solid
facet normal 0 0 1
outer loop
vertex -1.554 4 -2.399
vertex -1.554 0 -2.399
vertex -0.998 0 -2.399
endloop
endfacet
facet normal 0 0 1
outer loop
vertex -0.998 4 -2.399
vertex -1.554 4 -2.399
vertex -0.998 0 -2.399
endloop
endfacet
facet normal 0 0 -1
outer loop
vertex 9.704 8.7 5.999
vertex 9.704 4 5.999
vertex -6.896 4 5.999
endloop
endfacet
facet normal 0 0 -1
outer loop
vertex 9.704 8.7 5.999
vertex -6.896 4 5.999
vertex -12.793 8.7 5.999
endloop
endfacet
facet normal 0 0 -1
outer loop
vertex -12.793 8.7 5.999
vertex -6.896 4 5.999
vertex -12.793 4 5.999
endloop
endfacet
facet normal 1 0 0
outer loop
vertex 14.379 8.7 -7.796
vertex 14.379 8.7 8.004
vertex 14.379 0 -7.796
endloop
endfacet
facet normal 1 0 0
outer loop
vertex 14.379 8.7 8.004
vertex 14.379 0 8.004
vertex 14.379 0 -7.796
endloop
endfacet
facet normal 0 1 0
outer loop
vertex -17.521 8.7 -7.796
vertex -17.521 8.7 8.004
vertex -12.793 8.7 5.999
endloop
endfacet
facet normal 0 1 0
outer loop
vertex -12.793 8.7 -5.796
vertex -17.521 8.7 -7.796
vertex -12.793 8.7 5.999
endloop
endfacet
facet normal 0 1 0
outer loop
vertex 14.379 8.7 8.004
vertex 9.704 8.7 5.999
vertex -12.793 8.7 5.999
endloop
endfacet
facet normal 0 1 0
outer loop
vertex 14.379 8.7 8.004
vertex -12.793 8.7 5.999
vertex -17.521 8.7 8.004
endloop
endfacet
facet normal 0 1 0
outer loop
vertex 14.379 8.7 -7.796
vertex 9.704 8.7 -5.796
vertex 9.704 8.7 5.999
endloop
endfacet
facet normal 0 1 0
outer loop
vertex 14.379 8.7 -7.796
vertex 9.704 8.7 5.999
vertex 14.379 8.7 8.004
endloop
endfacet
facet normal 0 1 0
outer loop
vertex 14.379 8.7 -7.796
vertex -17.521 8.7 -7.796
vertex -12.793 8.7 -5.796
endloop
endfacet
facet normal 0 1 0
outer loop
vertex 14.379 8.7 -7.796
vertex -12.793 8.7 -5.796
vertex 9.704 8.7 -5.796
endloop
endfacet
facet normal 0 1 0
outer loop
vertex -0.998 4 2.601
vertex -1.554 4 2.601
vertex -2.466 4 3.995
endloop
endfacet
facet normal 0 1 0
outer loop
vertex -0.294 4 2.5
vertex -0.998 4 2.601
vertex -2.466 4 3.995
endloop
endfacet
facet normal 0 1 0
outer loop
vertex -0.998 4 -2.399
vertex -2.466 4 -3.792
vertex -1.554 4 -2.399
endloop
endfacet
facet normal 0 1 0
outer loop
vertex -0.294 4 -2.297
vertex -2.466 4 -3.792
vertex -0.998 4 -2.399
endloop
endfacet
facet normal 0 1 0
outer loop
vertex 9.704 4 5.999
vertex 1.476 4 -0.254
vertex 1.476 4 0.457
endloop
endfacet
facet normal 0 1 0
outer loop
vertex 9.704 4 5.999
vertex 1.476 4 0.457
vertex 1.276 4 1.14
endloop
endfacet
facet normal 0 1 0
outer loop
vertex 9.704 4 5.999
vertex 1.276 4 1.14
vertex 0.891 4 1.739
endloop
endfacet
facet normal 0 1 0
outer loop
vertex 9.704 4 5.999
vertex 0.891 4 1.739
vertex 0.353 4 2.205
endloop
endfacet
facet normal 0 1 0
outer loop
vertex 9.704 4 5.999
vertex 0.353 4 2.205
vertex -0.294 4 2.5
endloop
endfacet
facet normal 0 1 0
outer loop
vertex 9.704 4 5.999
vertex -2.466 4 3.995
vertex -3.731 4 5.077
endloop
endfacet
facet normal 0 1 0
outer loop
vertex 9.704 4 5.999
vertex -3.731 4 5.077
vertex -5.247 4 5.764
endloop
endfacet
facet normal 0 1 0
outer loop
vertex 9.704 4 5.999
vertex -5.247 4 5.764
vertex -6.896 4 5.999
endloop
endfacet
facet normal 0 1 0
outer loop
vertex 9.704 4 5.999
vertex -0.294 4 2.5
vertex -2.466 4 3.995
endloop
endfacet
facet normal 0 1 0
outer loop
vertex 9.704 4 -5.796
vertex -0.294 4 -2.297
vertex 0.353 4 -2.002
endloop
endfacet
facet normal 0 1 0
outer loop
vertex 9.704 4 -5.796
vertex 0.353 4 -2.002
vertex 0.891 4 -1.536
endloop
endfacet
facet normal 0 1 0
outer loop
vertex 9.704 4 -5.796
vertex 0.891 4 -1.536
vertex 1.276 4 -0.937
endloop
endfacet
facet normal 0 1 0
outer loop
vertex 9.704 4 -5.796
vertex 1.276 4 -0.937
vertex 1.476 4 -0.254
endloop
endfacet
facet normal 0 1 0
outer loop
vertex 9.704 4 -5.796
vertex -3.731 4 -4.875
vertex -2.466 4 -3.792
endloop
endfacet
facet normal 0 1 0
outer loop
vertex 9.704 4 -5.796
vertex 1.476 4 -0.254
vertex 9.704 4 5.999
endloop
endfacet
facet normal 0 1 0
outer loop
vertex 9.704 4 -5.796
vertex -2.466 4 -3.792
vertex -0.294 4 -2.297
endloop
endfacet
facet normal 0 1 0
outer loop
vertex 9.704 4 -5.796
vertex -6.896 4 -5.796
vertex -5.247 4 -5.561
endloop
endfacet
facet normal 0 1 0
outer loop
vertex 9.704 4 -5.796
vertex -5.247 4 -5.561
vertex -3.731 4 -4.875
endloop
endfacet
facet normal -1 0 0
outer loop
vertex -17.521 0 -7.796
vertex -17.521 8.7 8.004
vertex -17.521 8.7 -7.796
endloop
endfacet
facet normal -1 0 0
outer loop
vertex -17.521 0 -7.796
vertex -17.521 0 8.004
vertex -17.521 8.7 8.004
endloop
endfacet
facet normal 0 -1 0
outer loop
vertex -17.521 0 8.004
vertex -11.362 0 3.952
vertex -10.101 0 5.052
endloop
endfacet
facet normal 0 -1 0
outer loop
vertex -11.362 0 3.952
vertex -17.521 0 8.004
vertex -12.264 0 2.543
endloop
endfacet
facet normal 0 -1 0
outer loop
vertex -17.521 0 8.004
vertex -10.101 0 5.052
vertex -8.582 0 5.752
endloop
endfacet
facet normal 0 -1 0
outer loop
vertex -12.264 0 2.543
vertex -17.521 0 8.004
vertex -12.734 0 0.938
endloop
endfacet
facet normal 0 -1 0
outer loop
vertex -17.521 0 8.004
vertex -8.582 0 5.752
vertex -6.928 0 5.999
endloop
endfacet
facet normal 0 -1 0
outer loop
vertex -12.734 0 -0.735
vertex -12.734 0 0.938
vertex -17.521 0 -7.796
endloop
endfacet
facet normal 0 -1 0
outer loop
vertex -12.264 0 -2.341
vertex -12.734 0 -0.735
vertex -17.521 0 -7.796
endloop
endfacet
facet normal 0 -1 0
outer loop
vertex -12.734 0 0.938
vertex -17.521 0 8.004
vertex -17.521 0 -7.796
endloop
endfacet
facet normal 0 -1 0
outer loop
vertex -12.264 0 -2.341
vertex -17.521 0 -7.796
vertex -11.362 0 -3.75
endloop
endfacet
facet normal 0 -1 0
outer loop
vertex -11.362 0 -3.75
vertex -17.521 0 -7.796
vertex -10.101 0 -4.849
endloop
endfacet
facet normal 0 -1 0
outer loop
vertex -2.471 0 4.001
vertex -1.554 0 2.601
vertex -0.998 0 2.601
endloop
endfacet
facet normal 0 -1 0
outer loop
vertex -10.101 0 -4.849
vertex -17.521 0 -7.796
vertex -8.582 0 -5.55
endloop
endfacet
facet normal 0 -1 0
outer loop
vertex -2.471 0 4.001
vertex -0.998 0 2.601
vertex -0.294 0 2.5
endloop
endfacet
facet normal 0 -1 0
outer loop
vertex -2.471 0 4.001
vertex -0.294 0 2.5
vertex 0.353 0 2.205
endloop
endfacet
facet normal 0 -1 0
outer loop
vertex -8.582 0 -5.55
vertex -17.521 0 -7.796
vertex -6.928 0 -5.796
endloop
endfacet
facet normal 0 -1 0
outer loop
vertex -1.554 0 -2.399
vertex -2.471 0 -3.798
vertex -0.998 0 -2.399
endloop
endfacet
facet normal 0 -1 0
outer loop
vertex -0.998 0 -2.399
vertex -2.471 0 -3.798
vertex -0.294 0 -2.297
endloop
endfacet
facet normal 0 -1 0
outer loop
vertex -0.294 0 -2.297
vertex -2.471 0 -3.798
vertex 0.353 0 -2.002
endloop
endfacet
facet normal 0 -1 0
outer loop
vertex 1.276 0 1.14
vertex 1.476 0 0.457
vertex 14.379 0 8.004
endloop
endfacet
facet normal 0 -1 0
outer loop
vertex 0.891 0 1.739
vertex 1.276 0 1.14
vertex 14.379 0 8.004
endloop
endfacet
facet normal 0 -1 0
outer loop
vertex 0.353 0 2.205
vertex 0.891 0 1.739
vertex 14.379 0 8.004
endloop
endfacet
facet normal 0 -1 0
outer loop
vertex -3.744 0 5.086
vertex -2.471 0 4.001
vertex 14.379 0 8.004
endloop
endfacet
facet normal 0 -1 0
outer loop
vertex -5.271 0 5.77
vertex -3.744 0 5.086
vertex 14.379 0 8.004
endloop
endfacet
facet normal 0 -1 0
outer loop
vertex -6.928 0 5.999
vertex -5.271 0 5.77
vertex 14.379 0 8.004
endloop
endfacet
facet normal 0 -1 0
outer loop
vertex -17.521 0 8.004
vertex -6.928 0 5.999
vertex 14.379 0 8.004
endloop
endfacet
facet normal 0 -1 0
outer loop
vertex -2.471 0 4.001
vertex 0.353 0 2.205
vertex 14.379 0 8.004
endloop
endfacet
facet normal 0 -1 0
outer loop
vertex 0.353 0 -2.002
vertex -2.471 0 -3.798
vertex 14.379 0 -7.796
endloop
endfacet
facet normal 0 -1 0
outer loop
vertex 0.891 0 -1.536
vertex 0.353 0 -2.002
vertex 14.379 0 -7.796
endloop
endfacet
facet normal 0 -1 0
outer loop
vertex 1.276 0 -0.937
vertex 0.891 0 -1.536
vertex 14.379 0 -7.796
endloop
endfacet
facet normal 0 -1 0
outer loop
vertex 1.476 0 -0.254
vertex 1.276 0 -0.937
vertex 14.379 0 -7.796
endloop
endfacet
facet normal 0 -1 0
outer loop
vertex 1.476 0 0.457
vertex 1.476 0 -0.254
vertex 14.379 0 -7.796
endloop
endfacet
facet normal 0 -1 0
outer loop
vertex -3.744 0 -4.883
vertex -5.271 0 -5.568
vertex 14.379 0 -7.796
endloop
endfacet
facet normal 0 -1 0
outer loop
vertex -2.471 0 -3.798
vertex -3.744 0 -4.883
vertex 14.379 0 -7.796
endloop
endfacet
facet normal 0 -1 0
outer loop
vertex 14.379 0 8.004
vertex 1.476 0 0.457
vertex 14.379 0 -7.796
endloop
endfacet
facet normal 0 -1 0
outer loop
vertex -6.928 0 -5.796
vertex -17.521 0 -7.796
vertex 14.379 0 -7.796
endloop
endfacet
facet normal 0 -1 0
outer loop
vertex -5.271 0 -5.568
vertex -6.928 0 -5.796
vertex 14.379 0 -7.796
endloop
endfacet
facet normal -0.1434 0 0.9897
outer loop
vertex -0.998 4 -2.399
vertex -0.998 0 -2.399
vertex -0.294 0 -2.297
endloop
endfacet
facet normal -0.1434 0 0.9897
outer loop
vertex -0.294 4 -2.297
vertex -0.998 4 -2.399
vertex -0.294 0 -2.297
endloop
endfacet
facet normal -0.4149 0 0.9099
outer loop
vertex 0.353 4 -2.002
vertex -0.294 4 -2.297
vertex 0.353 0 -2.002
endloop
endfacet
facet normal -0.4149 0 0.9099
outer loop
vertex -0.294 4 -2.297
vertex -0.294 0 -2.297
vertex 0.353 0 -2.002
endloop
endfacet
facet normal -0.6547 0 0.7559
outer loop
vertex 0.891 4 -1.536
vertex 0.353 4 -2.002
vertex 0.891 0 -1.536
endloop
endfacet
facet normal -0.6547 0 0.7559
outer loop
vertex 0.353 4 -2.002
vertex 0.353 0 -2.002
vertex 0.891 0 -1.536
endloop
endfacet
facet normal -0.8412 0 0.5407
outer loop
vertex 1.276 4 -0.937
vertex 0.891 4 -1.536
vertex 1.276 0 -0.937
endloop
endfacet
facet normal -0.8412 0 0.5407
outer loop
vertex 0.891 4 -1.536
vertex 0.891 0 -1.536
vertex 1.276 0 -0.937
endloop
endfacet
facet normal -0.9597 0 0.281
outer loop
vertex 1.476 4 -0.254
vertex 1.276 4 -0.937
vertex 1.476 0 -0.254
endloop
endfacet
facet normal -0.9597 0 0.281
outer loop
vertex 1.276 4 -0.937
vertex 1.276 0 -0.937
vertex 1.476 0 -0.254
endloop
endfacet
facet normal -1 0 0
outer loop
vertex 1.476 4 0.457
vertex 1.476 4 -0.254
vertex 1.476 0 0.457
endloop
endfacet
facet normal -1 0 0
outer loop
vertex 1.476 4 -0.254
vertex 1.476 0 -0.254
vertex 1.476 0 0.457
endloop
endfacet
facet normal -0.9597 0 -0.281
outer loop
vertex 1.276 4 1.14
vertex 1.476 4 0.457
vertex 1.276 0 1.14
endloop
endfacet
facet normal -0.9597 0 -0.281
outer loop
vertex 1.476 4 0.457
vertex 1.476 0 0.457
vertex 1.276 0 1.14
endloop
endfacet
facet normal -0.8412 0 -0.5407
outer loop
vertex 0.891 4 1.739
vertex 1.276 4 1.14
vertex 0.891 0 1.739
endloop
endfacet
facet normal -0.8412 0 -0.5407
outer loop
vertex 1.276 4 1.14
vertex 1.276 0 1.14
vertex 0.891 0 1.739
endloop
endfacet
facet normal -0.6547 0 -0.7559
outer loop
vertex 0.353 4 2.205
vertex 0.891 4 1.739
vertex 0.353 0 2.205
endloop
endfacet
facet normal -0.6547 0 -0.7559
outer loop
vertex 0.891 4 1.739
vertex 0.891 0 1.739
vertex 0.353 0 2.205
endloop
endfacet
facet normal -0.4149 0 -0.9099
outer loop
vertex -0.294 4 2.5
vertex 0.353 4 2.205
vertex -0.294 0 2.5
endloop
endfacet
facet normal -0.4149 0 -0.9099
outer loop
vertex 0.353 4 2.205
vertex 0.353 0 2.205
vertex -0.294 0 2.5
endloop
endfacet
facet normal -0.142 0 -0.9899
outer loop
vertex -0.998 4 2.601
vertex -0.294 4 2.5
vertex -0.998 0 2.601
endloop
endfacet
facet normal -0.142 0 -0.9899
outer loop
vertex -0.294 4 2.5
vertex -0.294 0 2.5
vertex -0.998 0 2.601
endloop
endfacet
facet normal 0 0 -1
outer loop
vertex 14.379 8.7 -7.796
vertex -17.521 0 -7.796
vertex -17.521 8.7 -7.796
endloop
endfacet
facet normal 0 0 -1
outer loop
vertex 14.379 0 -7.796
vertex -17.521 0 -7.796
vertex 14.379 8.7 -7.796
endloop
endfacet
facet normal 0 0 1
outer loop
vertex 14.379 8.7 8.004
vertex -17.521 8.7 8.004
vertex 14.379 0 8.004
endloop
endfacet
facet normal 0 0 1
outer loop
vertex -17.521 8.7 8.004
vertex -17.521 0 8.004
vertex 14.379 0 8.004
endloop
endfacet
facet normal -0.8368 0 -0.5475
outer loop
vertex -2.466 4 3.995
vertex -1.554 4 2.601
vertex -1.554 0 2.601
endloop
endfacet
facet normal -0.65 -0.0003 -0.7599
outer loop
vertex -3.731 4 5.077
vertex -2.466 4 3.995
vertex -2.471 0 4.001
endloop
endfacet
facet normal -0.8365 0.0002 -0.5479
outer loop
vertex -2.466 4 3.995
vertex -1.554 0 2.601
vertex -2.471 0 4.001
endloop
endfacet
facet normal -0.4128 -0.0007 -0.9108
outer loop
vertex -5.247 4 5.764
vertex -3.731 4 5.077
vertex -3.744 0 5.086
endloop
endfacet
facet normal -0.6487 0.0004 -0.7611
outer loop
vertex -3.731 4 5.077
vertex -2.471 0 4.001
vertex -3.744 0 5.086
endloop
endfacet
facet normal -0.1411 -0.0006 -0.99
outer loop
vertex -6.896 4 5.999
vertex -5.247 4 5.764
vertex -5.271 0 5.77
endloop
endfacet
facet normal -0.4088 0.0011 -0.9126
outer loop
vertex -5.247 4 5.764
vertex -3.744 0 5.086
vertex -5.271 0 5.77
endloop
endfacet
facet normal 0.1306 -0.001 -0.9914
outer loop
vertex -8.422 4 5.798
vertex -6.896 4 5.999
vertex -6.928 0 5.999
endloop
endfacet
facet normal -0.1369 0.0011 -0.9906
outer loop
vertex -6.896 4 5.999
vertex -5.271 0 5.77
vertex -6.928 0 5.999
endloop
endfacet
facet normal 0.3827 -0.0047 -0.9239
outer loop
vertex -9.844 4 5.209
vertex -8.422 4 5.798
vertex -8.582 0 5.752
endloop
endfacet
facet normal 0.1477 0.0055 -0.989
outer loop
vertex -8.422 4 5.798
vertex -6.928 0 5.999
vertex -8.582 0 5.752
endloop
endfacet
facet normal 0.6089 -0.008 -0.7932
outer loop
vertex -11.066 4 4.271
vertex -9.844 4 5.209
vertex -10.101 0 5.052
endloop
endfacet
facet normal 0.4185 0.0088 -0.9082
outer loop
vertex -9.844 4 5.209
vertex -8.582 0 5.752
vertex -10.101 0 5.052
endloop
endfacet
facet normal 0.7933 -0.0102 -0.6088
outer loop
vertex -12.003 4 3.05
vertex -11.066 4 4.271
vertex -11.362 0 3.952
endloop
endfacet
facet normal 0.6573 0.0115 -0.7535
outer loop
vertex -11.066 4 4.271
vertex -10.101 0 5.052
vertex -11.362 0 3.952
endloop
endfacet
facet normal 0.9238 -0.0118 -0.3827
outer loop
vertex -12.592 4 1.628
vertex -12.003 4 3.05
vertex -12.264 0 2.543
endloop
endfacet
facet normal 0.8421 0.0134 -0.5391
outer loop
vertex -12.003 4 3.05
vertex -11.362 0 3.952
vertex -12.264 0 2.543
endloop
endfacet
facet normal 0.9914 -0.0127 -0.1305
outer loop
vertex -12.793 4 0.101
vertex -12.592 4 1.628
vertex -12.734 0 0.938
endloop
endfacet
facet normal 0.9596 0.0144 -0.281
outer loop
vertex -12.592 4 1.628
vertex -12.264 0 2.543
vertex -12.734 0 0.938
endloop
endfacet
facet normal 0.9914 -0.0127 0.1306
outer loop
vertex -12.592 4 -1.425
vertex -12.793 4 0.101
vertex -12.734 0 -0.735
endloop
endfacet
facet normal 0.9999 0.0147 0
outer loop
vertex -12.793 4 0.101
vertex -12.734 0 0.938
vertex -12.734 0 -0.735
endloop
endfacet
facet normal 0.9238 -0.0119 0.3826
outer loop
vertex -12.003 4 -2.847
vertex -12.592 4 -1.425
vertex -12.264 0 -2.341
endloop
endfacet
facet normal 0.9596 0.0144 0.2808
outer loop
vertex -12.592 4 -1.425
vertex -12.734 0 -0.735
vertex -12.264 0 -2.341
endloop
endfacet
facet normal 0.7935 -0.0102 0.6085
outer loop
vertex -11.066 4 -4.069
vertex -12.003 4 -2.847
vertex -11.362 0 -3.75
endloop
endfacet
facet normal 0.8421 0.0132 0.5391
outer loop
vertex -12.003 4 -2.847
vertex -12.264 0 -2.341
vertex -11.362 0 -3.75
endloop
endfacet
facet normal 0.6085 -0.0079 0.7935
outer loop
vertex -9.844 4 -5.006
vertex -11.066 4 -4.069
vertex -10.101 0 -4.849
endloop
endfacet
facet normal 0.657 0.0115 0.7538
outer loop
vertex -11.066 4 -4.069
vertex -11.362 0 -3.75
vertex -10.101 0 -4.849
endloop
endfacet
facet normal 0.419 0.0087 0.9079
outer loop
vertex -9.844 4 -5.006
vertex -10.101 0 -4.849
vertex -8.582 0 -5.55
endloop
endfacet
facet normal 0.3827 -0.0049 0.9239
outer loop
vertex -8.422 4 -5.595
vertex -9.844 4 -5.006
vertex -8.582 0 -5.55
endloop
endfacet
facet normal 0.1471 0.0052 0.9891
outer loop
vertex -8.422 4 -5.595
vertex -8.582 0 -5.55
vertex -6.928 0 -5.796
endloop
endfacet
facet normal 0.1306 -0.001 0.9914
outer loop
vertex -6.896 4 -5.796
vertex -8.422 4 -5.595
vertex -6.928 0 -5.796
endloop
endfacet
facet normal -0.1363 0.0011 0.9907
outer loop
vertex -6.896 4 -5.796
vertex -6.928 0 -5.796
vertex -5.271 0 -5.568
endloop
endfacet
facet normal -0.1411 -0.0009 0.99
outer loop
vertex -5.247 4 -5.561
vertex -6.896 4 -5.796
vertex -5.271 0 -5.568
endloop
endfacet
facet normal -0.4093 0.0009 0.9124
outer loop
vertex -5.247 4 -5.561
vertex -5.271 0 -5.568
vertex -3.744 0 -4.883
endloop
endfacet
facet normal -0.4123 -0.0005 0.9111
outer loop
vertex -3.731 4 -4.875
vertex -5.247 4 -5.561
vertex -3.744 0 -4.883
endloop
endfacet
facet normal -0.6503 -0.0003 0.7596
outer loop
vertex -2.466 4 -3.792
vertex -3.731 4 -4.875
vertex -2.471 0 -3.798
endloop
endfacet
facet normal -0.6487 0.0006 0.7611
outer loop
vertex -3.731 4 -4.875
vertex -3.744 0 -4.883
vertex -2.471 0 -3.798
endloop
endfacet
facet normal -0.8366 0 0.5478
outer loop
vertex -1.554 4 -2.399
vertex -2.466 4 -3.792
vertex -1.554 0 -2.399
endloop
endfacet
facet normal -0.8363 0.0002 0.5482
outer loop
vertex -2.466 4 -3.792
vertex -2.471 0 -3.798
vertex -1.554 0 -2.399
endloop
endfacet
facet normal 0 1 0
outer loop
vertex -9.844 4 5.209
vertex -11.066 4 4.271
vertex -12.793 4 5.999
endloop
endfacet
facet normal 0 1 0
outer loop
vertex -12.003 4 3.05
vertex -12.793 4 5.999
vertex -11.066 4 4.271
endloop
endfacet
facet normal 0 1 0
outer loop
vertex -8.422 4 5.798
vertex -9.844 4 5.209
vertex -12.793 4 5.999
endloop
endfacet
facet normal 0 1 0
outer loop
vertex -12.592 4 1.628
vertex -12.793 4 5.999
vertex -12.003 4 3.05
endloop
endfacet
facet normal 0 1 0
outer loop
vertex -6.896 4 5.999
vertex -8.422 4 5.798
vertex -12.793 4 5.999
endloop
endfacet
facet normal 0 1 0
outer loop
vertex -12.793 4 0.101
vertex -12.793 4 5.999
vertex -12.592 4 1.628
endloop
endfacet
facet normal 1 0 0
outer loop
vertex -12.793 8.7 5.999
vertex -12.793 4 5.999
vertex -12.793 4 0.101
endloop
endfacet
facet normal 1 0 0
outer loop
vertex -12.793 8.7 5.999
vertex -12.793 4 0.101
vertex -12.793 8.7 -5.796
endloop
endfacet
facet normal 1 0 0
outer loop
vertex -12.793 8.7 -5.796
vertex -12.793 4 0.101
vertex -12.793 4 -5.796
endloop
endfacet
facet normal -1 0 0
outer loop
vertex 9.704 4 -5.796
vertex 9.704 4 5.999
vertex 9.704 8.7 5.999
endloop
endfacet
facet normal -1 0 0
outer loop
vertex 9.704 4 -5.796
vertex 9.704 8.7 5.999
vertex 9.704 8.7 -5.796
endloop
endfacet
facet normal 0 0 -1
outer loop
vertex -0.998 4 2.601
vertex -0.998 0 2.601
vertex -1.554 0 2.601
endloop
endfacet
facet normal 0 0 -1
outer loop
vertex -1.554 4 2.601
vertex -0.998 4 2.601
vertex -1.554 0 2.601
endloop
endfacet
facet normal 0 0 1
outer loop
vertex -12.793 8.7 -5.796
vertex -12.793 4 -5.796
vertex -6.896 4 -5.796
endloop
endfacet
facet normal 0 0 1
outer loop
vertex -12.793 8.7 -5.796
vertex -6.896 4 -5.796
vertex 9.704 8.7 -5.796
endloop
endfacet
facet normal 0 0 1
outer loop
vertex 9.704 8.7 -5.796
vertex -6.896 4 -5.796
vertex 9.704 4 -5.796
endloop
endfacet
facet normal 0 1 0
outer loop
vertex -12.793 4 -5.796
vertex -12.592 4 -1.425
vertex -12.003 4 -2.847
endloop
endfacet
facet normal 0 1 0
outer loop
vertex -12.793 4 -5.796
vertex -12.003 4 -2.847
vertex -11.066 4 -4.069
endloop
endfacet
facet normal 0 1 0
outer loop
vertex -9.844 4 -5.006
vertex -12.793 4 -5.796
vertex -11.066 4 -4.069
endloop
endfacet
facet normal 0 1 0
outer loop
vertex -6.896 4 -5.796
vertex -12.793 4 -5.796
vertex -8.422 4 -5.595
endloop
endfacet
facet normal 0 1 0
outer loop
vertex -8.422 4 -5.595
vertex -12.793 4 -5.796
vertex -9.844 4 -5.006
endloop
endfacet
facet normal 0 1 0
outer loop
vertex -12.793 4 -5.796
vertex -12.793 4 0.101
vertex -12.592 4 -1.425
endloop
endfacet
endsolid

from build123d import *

# Parameters (mm, degrees)
BOSS_EXTRUDE5_DEPTH = 4
SKETCH8_W           = 31.9
SKETCH8_H           = 15.8
BOSS_EXTRUDE8_DEPTH = 4.7


with BuildPart() as part:
    # Sketch1 → Boss-Extrude5 (new body)
    with BuildSketch(Plane(origin=(0, 0, 0), x_dir=(1, 0, 0), z_dir=(0, 1, 0))):
        Polygon((-17.521212205, 5.796054243), (-17.521212205, -6.003945757), (-17.521212205, -8.003945757), (14.378787795, -8.003945757), (14.378787795, -6.003945757), (14.378787795, 5.796054243), (14.378787795, 7.796054243), (-17.521212205, 7.796054243), align=None)
        with BuildLine():
            Line((-0.998289948, -2.601375998), (-1.554401677, -2.601375998))
            ThreePointArc((-1.554401677, -2.601375998), (-12.793150429, -0.101375998), (-1.554401677, 2.398624002))
            Line((-1.554401677, 2.398624002), (-0.998289948, 2.398624002))
            ThreePointArc((-0.998289948, 2.398624002), (1.501710052, -0.101375998), (-0.998289948, -2.601375998))
        make_face(mode=Mode.SUBTRACT)
    extrude(amount=BOSS_EXTRUDE5_DEPTH)

    # Sketch8 → Boss-Extrude8 (add)
    with BuildSketch(Plane(origin=(0, 4, 0), x_dir=(1, 0, 0), z_dir=(0, 1, 0))):
        with Locations((-1.571212205, -0.103945757)):
            Rectangle(SKETCH8_W, SKETCH8_H)
        Polygon((-6.895720189, 5.796054243), (-12.793150429, 5.796054243), (-12.793150429, -0.101375998), (-12.793150429, -5.998806238), (-6.895720189, -5.998806238), (9.704279811, -5.998806238), (9.704279811, 5.796054243), align=None, mode=Mode.SUBTRACT)
    extrude(amount=BOSS_EXTRUDE8_DEPTH)


solid = part.part
